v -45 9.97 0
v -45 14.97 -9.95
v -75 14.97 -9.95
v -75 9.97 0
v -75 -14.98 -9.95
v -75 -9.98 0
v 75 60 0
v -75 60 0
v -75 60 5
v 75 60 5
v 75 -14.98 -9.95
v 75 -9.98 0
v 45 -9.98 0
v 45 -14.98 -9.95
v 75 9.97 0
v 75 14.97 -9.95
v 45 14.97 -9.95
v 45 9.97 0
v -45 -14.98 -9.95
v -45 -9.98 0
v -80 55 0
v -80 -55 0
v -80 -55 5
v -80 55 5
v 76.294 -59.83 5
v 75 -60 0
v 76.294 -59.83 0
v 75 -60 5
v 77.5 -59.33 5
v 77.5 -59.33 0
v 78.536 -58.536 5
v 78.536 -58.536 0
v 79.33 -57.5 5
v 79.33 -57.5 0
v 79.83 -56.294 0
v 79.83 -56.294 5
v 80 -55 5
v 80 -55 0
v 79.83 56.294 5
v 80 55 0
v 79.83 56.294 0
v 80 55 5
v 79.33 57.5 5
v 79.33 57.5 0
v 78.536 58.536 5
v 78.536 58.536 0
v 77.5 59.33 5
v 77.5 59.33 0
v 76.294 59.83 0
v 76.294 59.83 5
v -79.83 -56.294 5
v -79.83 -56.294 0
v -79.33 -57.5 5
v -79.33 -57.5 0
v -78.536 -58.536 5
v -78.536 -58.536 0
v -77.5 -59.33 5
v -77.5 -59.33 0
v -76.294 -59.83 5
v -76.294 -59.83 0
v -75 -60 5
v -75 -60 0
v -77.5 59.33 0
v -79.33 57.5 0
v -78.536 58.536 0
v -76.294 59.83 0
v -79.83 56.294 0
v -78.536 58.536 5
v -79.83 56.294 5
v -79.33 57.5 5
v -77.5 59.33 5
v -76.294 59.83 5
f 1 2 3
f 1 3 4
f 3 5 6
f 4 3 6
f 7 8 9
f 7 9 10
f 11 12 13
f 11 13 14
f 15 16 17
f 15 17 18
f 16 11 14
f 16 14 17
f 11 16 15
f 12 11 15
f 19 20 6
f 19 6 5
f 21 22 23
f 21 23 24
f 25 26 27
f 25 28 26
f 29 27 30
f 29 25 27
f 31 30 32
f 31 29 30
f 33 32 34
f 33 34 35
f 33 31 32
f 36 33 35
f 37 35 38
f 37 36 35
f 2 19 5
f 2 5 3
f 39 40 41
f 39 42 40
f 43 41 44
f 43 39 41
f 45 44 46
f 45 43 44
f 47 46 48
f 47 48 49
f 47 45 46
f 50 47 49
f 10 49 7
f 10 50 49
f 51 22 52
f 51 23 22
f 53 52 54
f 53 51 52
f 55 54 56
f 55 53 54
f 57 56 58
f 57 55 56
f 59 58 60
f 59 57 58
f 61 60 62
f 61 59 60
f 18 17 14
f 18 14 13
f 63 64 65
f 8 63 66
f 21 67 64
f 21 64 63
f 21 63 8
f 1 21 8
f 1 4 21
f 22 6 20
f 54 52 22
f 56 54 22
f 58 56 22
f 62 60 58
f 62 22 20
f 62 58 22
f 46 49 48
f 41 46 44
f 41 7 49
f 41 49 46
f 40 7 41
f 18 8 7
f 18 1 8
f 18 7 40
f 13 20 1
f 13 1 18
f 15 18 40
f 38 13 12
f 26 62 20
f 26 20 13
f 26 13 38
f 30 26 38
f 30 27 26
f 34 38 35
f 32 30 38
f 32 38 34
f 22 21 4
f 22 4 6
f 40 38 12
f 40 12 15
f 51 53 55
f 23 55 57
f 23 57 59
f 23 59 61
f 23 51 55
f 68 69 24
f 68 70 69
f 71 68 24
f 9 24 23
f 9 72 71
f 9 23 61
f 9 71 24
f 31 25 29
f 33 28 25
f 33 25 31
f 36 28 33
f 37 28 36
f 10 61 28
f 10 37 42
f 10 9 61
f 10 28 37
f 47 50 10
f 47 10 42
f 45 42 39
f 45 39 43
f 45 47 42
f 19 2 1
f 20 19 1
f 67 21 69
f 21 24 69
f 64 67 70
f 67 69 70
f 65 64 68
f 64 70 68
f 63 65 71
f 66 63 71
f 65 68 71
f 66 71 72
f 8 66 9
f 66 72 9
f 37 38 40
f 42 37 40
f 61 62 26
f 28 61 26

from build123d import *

# Parameters (mm, degrees)
F0_W          = 160
F0_H          = 120
F1_DEPTH      = 5
F2_R          = 5
F4_DEPTH      = 160
F5_W          = 90
F5_H          = 15
F5_W_2        = 5
F6_DEPTH      = 25
F6_DEPTH_BACK = 25


with BuildPart() as f1:
    # F0 (on Top) → F1 (new body)
    with BuildSketch(Plane.XY):
        Rectangle(F0_W, F0_H)
    extrude(amount=F1_DEPTH)

    # F2
    f2_edges = [f1.edges().sort_by_distance(p)[0] for p in [
        (80, 60, 2.5),
        (80, -60, 2.5),
        (-80, -60, 2.5),
        (-80, 60, 2.5),
    ]]
    fillet(f2_edges, radius=F2_R)

    # F3 (on face) → F4 (join)
    with BuildSketch(Plane.YZ.offset(80)):
        Polygon((9.97, 0), (-9.98, 0), (-14.98, -9.95), (14.97, -9.95), align=None)
    extrude(amount=-F4_DEPTH)

    # F5 (on Front) → F6 (cut, two sides)
    with BuildSketch(Plane.XZ) as f6_sk:
        with Locations((0, -7.5)):
            Rectangle(F5_W, F5_H)
        with Locations((-77.5, -7.5)):
            Rectangle(F5_W_2, F5_H)
        with Locations((77.5, -7.5)):
            Rectangle(F5_W_2, F5_H)
    extrude(amount=F6_DEPTH, mode=Mode.SUBTRACT)
    extrude(f6_sk.sketch, amount=-F6_DEPTH_BACK, mode=Mode.SUBTRACT)


solid = f1.part
